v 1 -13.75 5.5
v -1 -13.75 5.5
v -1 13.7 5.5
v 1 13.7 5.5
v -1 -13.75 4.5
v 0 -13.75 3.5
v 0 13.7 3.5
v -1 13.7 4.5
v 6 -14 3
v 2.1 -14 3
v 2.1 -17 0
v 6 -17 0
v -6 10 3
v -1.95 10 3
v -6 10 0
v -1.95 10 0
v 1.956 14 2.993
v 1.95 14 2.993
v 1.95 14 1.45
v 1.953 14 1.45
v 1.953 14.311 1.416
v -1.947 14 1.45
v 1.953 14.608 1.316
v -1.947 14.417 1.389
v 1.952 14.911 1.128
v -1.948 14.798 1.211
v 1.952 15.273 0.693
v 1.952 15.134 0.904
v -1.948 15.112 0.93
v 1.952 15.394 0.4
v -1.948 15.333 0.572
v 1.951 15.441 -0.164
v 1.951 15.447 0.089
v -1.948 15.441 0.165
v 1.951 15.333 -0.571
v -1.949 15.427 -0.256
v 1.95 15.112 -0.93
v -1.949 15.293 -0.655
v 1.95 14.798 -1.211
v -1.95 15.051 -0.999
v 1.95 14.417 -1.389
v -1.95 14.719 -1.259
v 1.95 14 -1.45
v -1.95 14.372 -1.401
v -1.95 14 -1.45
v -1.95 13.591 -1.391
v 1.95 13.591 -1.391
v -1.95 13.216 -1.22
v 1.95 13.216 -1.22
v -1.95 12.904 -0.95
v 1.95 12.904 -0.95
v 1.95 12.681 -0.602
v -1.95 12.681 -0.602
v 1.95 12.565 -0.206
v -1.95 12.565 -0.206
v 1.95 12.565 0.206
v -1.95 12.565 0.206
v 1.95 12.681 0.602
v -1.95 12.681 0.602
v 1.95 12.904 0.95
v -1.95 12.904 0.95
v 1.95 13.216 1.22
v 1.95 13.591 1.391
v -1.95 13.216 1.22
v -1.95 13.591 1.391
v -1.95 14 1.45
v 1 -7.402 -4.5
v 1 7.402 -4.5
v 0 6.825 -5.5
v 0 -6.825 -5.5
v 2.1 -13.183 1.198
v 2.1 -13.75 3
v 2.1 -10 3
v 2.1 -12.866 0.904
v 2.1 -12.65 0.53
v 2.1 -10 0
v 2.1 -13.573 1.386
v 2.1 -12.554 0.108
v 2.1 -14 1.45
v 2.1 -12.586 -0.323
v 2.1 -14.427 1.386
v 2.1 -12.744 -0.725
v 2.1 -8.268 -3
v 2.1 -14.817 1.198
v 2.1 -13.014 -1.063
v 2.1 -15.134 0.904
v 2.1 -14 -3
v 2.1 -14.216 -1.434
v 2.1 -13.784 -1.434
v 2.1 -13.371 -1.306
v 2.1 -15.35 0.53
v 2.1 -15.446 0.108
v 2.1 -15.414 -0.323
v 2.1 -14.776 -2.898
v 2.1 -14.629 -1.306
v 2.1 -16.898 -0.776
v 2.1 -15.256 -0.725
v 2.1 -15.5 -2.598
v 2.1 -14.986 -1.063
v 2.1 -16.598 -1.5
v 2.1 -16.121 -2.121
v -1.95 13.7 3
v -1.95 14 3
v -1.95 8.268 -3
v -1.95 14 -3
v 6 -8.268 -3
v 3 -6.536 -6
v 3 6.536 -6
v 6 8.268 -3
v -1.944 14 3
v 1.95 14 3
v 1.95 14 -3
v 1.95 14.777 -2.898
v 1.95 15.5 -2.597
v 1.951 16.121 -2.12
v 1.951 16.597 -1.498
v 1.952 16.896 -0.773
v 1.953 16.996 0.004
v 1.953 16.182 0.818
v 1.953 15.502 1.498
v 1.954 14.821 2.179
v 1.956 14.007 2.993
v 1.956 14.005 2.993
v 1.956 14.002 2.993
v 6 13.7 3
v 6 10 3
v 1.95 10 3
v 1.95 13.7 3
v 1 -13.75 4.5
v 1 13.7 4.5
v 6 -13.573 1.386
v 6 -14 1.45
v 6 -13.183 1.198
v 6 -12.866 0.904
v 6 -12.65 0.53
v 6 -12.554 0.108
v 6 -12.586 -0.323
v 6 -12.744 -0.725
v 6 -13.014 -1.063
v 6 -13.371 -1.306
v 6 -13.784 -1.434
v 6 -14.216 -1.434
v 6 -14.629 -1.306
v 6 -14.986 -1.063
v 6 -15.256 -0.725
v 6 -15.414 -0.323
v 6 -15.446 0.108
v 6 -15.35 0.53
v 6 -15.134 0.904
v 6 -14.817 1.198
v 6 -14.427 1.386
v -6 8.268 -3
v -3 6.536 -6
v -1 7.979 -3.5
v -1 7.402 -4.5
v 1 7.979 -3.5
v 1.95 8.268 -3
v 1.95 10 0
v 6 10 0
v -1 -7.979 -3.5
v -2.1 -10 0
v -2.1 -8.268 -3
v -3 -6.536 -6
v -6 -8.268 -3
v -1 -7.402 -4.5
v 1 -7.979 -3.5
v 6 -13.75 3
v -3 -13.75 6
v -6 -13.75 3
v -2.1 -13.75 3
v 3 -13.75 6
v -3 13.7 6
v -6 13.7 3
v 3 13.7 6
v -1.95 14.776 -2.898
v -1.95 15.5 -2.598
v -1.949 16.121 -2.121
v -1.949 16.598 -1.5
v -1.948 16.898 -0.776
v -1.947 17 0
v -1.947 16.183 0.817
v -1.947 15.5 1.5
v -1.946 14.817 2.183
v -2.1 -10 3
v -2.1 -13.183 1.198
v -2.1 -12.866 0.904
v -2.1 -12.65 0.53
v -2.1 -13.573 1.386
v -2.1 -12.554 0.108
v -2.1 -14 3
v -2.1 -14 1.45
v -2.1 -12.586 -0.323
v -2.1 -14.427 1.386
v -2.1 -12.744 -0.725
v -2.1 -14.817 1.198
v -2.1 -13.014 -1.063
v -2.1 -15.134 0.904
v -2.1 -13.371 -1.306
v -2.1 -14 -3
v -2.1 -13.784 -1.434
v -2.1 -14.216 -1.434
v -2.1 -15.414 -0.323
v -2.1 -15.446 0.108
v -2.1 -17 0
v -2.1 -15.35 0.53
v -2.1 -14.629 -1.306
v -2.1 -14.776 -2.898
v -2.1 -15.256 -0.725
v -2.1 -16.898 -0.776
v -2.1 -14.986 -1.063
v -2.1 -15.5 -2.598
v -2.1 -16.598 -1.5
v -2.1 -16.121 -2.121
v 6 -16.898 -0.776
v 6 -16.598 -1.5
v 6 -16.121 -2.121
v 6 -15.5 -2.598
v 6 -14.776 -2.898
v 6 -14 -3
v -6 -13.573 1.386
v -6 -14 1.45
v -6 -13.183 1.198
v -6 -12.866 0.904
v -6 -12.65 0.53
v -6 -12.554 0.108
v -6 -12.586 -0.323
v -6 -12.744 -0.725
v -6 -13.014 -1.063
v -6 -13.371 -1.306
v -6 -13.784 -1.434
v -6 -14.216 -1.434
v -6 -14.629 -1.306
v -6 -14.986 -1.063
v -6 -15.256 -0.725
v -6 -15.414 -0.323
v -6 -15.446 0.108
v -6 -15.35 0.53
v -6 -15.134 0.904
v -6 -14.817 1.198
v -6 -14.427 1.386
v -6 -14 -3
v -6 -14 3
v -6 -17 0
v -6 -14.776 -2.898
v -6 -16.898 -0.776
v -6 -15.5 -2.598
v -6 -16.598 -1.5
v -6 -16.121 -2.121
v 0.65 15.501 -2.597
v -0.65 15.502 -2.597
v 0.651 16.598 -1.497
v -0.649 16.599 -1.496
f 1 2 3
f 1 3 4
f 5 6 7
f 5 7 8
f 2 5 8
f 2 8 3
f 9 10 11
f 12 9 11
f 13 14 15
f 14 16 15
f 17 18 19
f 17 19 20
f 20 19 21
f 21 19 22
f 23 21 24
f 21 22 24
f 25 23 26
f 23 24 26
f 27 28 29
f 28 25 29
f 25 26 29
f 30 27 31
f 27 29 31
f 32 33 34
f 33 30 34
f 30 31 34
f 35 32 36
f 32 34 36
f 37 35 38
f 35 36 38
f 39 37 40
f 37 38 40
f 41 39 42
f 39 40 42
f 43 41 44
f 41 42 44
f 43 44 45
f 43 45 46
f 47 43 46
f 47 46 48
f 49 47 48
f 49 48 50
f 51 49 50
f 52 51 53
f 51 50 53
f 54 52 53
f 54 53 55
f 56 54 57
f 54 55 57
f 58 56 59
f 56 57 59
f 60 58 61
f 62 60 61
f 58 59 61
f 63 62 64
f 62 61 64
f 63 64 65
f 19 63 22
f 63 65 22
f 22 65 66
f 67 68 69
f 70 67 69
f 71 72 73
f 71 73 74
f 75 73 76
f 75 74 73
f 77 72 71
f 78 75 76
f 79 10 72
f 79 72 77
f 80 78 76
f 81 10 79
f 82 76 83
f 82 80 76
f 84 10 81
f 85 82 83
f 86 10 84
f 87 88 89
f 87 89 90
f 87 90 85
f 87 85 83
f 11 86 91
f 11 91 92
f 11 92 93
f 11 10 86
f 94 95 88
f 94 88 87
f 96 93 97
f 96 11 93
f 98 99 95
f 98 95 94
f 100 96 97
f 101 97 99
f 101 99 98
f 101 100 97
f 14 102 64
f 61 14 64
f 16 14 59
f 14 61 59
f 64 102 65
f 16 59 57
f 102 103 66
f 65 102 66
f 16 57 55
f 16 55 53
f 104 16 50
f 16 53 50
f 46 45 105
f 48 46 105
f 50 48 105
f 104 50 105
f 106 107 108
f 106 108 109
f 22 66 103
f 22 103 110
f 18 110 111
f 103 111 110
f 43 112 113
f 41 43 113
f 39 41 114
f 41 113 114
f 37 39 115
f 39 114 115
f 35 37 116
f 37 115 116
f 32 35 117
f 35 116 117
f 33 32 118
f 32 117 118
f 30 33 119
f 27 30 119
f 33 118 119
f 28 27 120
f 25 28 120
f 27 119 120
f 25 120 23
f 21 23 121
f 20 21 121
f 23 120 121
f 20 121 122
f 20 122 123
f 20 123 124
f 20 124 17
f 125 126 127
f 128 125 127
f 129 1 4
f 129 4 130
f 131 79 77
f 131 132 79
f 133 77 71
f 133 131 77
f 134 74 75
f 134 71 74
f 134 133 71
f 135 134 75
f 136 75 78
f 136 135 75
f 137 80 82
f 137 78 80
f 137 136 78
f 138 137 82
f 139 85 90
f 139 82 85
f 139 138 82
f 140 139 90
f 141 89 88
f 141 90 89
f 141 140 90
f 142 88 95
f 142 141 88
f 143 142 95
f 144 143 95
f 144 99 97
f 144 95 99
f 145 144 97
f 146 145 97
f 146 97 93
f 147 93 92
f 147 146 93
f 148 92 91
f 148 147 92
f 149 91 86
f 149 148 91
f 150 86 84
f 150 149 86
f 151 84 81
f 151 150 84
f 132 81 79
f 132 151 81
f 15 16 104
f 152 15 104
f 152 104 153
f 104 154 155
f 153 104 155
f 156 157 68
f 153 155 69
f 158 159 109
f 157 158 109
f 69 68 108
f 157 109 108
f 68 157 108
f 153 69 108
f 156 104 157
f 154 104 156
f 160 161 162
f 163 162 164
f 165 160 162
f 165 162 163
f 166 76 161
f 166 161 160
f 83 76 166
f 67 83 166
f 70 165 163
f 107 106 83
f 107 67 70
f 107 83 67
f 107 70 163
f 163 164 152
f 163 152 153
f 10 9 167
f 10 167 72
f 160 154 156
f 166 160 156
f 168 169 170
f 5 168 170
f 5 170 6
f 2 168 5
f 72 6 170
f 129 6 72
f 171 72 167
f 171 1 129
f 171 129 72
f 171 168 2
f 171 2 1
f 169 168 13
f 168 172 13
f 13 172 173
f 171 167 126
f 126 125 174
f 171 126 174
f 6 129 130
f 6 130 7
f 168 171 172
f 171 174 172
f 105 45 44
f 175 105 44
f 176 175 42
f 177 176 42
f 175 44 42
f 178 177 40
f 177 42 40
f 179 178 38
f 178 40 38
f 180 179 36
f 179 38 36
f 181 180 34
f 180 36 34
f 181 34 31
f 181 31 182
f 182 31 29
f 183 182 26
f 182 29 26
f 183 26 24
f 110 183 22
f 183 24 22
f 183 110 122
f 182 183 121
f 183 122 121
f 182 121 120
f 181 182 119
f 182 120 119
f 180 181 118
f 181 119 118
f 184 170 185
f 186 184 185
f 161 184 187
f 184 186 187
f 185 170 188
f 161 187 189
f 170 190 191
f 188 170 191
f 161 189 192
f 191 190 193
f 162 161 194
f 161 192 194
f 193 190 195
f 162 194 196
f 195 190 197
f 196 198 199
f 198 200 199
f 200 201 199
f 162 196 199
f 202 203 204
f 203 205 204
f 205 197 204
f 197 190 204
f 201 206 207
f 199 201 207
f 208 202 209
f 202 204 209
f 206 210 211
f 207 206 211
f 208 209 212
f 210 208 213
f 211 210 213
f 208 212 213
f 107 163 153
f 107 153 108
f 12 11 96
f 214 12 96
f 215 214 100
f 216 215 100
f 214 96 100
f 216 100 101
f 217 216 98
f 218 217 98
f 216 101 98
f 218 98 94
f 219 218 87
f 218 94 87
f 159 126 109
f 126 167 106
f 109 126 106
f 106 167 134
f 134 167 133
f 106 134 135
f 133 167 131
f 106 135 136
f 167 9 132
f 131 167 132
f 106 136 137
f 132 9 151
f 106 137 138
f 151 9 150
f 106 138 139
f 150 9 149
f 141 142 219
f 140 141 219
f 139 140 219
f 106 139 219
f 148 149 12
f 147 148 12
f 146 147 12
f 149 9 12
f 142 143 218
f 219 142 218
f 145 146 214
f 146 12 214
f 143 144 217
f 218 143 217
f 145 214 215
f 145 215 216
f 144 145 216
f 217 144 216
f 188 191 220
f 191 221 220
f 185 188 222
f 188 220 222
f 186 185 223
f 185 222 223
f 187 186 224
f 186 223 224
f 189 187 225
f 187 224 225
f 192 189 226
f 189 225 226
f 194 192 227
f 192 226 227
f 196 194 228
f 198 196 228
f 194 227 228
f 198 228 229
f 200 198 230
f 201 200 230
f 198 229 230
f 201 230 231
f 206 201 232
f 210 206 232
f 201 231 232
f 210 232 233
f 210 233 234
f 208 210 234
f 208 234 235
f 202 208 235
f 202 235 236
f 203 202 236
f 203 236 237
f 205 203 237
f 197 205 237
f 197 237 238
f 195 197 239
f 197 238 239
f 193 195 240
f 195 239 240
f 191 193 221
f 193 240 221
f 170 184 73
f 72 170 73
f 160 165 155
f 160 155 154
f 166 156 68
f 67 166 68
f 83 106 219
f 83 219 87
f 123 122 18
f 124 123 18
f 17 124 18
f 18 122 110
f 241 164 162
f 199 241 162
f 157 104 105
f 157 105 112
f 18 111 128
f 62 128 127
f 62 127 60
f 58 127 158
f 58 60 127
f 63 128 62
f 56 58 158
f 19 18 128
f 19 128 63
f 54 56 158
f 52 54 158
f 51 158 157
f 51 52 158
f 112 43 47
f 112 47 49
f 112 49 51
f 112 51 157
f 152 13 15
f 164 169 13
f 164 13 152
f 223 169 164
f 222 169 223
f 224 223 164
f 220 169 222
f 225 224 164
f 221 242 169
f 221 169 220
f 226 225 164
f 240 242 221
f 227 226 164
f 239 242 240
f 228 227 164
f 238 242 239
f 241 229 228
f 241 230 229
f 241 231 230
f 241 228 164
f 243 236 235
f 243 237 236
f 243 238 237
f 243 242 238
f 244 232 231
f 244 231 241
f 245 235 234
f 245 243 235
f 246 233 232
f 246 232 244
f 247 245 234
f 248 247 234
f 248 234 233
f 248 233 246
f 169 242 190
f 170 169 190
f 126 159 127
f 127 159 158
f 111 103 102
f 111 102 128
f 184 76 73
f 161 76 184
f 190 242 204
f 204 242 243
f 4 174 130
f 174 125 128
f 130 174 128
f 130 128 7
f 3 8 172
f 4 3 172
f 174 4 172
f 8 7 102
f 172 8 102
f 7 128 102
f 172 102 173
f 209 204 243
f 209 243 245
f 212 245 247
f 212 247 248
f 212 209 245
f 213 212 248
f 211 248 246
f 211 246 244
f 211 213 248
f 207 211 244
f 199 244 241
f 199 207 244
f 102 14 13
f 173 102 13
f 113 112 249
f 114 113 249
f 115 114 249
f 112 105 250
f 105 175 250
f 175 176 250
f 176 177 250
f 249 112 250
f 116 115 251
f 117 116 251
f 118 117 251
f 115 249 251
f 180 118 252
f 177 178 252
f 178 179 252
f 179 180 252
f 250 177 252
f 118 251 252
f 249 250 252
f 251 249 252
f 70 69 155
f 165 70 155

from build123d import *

# Parameters (mm, degrees)
BOSS_EXTRUDE1_DEPTH     = 10
CUT_EXTRUDE2_DEPTH      = 14.114877049
SKETCH6_W               = 3.9
SKETCH6_H               = 6
BOSS_EXTRUDE3_DEPTH     = 4
SKETCH7_W               = 3.9
SKETCH7_H               = 3
REVOLVE1_ANGLE          = 180
SKETCH9_R               = 1.45
CUT_EXTRUDE3_DEPTH      = 5
SKETCH10_W              = 3.9
SKETCH10_H              = 6
BOSS_EXTRUDE4_DEPTH     = 4
REVOLVE2_ANGLE          = 180
SKETCH14_R              = 1.45
CUT_EXTRUDE4_DEPTH      = 5
BOSS_EXTRUDE7_DEPTH     = 3.7
BOSS_EXTRUDE17_DEPTH    = 3.75
CUT_EXTRUDE6_DEPTH      = 20
CUT_EXTRUDE6_DEPTH_BACK = 20
CUT_EXTRUDE7_DEPTH      = 20.702855123
CUT_EXTRUDE7_DEPTH_BACK = 20.702855123
CUT_EXTRUDE8_DEPTH      = 22.656407828
CUT_EXTRUDE8_DEPTH_BACK = 22.656407828


with BuildPart() as part:
    # Sketch2 → Boss-Extrude1 (new, symmetric)
    with BuildSketch(Plane(origin=(0, 0, 0), x_dir=(1, 0, 0), z_dir=(0, 1, 0))):
        Polygon((-3, 6), (3, 6), (6, 3), (6, -3), (3, -6), (-3, -6), (-6, -3), (-6, 3), align=None)
    extrude(amount=BOSS_EXTRUDE1_DEPTH, both=True)

    # Sketch5 → Cut-Extrude2 (cut, symmetric)
    with BuildSketch(Plane(origin=(0, 0, 0), x_dir=(0, 0, -1), z_dir=(1, 0, 0))):
        Polygon((0, 10), (6, 6.535898385), (6, 10), align=None)
    cut_extrude2 = extrude(amount=CUT_EXTRUDE2_DEPTH, both=True, mode=Mode.SUBTRACT)

    # Mirror3: Cut-Extrude2 across plane
    add(cut_extrude2.mirror(Plane.ZX), mode=Mode.SUBTRACT)

    # Sketch6 → Boss-Extrude3 (add, symmetric)
    with BuildSketch(Plane.XZ.offset(10)):
        with Locations((-4.05, 0)):
            Rectangle(SKETCH6_W, SKETCH6_H)
    boss_extrude3 = extrude(amount=BOSS_EXTRUDE3_DEPTH, both=True)

    # Sketch7 → Revolve1 (revolve)
    with BuildSketch(Plane.XZ.offset(14)):
        with Locations((-4.05, 1.5)):
            Rectangle(SKETCH7_W, SKETCH7_H)
    revolve1 = revolve(axis=Axis((-6, -14, 0), (1, 0, 0)), revolution_arc=REVOLVE1_ANGLE)

    # Sketch9 → Cut-Extrude3 (cut, symmetric)
    with BuildSketch(Plane.ZY.offset(6)):
        with Locations((0, -14)):
            Circle(SKETCH9_R)
    cut_extrude3 = extrude(amount=CUT_EXTRUDE3_DEPTH, both=True, mode=Mode.SUBTRACT)

    # Mirror5: Boss-Extrude3, Revolve1, Cut-Extrude3 across plane
    add(boss_extrude3.mirror(Plane(origin=(0, 0, 0), x_dir=(0, 0, 1), z_dir=(1, 0, 0))))
    add(revolve1.mirror(Plane(origin=(0, 0, 0), x_dir=(0, 0, 1), z_dir=(1, 0, 0))))
    add(cut_extrude3.mirror(Plane(origin=(0, 0, 0), x_dir=(0, 0, 1), z_dir=(1, 0, 0))), mode=Mode.SUBTRACT)

    # Sketch10 → Boss-Extrude4 (add, symmetric)
    with BuildSketch(Plane(origin=(0, 10, 0), x_dir=(1, 0, 0), z_dir=(0, 1, 0))):
        Rectangle(SKETCH10_W, SKETCH10_H)
    extrude(amount=BOSS_EXTRUDE4_DEPTH, both=True)

    # Sketch12 → Revolve2 (revolve)
    with BuildSketch(Plane(origin=(0, 14, 0), x_dir=(1, 0, 0), z_dir=(0, 1, 0))):
        Polygon((-1.95, 3), (-1.95, 0), (1.95, 0.003655936), (1.95, 3), align=None)
    revolve(axis=Axis((-1.95, 14, 0), (0.9999995606226393, 0, -0.0009374190783233235)), revolution_arc=REVOLVE2_ANGLE)

    # Sketch14 → Cut-Extrude4 (cut, symmetric)
    with BuildSketch(Plane.ZY.offset(1.95)):
        with Locations((0, 14)):
            Circle(SKETCH14_R)
    extrude(amount=CUT_EXTRUDE4_DEPTH, both=True, mode=Mode.SUBTRACT)

    # Sketch17 → Boss-Extrude7 (add)
    with BuildSketch(Plane(origin=(0, 10, 0), x_dir=(1, 0, 0), z_dir=(0, 1, 0))):
        Polygon((-6, -3), (-1.95, -3), (1.95, -3), (6, -3), (3, -6), (-3, -6), align=None)
    extrude(amount=BOSS_EXTRUDE7_DEPTH)

    # Sketch19 → Boss-Extrude17 (add)
    with BuildSketch(Plane.XZ.offset(10)):
        Polygon((-6, 3), (-2.1, 3), (2.1, 3), (6, 3), (3, 6), (-3, 6), align=None)
    extrude(amount=BOSS_EXTRUDE17_DEPTH)

    # Sketch15 → Cut-Extrude6 (cut, two sides: drawn at the far end of the back side and taken through both)
    with BuildSketch(Plane(origin=(0, 0, 0), x_dir=(1, 0, 0), z_dir=(0, 1, 0)).offset(-CUT_EXTRUDE6_DEPTH_BACK)):
        Polygon((0, 5.5), (-1, 4.5), (-1, 3.5), (1, 3.5), (1, 4.5), align=None)
        Polygon((1, -4.5), (0, -3.5), (-1, -4.5), (-1, -5.5), (1, -5.5), align=None)
    extrude(amount=CUT_EXTRUDE6_DEPTH + CUT_EXTRUDE6_DEPTH_BACK, mode=Mode.SUBTRACT)

    # Sketch20 → Cut-Extrude7 (cut, two sides: drawn at the far end of the back side and taken through both)
    with BuildSketch(Plane.ZY.offset(1.95).offset(-CUT_EXTRUDE7_DEPTH_BACK)):
        Polygon((3, 14), (8.338e-05, 16.999998681), (8.6017e-05, 17.537492691), (3, 17.537492691), (3.371623525, 17.537492691), (3.371623525, 14), align=None)
    extrude(amount=CUT_EXTRUDE7_DEPTH + CUT_EXTRUDE7_DEPTH_BACK, mode=Mode.SUBTRACT)

    # Sketch21 → Cut-Extrude8 (cut, two sides: drawn at the far end of the back side and taken through both)
    with BuildSketch(Plane(origin=(6, 0, 0), x_dir=(0, 0, -1), z_dir=(1, 0, 0)).offset(-CUT_EXTRUDE8_DEPTH_BACK)):
        Polygon((-3, -14), (0, -17), (0, -17.720731205), (-3.510483934, -17.720731205), (-3.510483934, -14.510483934), (-3.510483934, -14), align=None)
    extrude(amount=CUT_EXTRUDE8_DEPTH + CUT_EXTRUDE8_DEPTH_BACK, mode=Mode.SUBTRACT)


solid = part.part
